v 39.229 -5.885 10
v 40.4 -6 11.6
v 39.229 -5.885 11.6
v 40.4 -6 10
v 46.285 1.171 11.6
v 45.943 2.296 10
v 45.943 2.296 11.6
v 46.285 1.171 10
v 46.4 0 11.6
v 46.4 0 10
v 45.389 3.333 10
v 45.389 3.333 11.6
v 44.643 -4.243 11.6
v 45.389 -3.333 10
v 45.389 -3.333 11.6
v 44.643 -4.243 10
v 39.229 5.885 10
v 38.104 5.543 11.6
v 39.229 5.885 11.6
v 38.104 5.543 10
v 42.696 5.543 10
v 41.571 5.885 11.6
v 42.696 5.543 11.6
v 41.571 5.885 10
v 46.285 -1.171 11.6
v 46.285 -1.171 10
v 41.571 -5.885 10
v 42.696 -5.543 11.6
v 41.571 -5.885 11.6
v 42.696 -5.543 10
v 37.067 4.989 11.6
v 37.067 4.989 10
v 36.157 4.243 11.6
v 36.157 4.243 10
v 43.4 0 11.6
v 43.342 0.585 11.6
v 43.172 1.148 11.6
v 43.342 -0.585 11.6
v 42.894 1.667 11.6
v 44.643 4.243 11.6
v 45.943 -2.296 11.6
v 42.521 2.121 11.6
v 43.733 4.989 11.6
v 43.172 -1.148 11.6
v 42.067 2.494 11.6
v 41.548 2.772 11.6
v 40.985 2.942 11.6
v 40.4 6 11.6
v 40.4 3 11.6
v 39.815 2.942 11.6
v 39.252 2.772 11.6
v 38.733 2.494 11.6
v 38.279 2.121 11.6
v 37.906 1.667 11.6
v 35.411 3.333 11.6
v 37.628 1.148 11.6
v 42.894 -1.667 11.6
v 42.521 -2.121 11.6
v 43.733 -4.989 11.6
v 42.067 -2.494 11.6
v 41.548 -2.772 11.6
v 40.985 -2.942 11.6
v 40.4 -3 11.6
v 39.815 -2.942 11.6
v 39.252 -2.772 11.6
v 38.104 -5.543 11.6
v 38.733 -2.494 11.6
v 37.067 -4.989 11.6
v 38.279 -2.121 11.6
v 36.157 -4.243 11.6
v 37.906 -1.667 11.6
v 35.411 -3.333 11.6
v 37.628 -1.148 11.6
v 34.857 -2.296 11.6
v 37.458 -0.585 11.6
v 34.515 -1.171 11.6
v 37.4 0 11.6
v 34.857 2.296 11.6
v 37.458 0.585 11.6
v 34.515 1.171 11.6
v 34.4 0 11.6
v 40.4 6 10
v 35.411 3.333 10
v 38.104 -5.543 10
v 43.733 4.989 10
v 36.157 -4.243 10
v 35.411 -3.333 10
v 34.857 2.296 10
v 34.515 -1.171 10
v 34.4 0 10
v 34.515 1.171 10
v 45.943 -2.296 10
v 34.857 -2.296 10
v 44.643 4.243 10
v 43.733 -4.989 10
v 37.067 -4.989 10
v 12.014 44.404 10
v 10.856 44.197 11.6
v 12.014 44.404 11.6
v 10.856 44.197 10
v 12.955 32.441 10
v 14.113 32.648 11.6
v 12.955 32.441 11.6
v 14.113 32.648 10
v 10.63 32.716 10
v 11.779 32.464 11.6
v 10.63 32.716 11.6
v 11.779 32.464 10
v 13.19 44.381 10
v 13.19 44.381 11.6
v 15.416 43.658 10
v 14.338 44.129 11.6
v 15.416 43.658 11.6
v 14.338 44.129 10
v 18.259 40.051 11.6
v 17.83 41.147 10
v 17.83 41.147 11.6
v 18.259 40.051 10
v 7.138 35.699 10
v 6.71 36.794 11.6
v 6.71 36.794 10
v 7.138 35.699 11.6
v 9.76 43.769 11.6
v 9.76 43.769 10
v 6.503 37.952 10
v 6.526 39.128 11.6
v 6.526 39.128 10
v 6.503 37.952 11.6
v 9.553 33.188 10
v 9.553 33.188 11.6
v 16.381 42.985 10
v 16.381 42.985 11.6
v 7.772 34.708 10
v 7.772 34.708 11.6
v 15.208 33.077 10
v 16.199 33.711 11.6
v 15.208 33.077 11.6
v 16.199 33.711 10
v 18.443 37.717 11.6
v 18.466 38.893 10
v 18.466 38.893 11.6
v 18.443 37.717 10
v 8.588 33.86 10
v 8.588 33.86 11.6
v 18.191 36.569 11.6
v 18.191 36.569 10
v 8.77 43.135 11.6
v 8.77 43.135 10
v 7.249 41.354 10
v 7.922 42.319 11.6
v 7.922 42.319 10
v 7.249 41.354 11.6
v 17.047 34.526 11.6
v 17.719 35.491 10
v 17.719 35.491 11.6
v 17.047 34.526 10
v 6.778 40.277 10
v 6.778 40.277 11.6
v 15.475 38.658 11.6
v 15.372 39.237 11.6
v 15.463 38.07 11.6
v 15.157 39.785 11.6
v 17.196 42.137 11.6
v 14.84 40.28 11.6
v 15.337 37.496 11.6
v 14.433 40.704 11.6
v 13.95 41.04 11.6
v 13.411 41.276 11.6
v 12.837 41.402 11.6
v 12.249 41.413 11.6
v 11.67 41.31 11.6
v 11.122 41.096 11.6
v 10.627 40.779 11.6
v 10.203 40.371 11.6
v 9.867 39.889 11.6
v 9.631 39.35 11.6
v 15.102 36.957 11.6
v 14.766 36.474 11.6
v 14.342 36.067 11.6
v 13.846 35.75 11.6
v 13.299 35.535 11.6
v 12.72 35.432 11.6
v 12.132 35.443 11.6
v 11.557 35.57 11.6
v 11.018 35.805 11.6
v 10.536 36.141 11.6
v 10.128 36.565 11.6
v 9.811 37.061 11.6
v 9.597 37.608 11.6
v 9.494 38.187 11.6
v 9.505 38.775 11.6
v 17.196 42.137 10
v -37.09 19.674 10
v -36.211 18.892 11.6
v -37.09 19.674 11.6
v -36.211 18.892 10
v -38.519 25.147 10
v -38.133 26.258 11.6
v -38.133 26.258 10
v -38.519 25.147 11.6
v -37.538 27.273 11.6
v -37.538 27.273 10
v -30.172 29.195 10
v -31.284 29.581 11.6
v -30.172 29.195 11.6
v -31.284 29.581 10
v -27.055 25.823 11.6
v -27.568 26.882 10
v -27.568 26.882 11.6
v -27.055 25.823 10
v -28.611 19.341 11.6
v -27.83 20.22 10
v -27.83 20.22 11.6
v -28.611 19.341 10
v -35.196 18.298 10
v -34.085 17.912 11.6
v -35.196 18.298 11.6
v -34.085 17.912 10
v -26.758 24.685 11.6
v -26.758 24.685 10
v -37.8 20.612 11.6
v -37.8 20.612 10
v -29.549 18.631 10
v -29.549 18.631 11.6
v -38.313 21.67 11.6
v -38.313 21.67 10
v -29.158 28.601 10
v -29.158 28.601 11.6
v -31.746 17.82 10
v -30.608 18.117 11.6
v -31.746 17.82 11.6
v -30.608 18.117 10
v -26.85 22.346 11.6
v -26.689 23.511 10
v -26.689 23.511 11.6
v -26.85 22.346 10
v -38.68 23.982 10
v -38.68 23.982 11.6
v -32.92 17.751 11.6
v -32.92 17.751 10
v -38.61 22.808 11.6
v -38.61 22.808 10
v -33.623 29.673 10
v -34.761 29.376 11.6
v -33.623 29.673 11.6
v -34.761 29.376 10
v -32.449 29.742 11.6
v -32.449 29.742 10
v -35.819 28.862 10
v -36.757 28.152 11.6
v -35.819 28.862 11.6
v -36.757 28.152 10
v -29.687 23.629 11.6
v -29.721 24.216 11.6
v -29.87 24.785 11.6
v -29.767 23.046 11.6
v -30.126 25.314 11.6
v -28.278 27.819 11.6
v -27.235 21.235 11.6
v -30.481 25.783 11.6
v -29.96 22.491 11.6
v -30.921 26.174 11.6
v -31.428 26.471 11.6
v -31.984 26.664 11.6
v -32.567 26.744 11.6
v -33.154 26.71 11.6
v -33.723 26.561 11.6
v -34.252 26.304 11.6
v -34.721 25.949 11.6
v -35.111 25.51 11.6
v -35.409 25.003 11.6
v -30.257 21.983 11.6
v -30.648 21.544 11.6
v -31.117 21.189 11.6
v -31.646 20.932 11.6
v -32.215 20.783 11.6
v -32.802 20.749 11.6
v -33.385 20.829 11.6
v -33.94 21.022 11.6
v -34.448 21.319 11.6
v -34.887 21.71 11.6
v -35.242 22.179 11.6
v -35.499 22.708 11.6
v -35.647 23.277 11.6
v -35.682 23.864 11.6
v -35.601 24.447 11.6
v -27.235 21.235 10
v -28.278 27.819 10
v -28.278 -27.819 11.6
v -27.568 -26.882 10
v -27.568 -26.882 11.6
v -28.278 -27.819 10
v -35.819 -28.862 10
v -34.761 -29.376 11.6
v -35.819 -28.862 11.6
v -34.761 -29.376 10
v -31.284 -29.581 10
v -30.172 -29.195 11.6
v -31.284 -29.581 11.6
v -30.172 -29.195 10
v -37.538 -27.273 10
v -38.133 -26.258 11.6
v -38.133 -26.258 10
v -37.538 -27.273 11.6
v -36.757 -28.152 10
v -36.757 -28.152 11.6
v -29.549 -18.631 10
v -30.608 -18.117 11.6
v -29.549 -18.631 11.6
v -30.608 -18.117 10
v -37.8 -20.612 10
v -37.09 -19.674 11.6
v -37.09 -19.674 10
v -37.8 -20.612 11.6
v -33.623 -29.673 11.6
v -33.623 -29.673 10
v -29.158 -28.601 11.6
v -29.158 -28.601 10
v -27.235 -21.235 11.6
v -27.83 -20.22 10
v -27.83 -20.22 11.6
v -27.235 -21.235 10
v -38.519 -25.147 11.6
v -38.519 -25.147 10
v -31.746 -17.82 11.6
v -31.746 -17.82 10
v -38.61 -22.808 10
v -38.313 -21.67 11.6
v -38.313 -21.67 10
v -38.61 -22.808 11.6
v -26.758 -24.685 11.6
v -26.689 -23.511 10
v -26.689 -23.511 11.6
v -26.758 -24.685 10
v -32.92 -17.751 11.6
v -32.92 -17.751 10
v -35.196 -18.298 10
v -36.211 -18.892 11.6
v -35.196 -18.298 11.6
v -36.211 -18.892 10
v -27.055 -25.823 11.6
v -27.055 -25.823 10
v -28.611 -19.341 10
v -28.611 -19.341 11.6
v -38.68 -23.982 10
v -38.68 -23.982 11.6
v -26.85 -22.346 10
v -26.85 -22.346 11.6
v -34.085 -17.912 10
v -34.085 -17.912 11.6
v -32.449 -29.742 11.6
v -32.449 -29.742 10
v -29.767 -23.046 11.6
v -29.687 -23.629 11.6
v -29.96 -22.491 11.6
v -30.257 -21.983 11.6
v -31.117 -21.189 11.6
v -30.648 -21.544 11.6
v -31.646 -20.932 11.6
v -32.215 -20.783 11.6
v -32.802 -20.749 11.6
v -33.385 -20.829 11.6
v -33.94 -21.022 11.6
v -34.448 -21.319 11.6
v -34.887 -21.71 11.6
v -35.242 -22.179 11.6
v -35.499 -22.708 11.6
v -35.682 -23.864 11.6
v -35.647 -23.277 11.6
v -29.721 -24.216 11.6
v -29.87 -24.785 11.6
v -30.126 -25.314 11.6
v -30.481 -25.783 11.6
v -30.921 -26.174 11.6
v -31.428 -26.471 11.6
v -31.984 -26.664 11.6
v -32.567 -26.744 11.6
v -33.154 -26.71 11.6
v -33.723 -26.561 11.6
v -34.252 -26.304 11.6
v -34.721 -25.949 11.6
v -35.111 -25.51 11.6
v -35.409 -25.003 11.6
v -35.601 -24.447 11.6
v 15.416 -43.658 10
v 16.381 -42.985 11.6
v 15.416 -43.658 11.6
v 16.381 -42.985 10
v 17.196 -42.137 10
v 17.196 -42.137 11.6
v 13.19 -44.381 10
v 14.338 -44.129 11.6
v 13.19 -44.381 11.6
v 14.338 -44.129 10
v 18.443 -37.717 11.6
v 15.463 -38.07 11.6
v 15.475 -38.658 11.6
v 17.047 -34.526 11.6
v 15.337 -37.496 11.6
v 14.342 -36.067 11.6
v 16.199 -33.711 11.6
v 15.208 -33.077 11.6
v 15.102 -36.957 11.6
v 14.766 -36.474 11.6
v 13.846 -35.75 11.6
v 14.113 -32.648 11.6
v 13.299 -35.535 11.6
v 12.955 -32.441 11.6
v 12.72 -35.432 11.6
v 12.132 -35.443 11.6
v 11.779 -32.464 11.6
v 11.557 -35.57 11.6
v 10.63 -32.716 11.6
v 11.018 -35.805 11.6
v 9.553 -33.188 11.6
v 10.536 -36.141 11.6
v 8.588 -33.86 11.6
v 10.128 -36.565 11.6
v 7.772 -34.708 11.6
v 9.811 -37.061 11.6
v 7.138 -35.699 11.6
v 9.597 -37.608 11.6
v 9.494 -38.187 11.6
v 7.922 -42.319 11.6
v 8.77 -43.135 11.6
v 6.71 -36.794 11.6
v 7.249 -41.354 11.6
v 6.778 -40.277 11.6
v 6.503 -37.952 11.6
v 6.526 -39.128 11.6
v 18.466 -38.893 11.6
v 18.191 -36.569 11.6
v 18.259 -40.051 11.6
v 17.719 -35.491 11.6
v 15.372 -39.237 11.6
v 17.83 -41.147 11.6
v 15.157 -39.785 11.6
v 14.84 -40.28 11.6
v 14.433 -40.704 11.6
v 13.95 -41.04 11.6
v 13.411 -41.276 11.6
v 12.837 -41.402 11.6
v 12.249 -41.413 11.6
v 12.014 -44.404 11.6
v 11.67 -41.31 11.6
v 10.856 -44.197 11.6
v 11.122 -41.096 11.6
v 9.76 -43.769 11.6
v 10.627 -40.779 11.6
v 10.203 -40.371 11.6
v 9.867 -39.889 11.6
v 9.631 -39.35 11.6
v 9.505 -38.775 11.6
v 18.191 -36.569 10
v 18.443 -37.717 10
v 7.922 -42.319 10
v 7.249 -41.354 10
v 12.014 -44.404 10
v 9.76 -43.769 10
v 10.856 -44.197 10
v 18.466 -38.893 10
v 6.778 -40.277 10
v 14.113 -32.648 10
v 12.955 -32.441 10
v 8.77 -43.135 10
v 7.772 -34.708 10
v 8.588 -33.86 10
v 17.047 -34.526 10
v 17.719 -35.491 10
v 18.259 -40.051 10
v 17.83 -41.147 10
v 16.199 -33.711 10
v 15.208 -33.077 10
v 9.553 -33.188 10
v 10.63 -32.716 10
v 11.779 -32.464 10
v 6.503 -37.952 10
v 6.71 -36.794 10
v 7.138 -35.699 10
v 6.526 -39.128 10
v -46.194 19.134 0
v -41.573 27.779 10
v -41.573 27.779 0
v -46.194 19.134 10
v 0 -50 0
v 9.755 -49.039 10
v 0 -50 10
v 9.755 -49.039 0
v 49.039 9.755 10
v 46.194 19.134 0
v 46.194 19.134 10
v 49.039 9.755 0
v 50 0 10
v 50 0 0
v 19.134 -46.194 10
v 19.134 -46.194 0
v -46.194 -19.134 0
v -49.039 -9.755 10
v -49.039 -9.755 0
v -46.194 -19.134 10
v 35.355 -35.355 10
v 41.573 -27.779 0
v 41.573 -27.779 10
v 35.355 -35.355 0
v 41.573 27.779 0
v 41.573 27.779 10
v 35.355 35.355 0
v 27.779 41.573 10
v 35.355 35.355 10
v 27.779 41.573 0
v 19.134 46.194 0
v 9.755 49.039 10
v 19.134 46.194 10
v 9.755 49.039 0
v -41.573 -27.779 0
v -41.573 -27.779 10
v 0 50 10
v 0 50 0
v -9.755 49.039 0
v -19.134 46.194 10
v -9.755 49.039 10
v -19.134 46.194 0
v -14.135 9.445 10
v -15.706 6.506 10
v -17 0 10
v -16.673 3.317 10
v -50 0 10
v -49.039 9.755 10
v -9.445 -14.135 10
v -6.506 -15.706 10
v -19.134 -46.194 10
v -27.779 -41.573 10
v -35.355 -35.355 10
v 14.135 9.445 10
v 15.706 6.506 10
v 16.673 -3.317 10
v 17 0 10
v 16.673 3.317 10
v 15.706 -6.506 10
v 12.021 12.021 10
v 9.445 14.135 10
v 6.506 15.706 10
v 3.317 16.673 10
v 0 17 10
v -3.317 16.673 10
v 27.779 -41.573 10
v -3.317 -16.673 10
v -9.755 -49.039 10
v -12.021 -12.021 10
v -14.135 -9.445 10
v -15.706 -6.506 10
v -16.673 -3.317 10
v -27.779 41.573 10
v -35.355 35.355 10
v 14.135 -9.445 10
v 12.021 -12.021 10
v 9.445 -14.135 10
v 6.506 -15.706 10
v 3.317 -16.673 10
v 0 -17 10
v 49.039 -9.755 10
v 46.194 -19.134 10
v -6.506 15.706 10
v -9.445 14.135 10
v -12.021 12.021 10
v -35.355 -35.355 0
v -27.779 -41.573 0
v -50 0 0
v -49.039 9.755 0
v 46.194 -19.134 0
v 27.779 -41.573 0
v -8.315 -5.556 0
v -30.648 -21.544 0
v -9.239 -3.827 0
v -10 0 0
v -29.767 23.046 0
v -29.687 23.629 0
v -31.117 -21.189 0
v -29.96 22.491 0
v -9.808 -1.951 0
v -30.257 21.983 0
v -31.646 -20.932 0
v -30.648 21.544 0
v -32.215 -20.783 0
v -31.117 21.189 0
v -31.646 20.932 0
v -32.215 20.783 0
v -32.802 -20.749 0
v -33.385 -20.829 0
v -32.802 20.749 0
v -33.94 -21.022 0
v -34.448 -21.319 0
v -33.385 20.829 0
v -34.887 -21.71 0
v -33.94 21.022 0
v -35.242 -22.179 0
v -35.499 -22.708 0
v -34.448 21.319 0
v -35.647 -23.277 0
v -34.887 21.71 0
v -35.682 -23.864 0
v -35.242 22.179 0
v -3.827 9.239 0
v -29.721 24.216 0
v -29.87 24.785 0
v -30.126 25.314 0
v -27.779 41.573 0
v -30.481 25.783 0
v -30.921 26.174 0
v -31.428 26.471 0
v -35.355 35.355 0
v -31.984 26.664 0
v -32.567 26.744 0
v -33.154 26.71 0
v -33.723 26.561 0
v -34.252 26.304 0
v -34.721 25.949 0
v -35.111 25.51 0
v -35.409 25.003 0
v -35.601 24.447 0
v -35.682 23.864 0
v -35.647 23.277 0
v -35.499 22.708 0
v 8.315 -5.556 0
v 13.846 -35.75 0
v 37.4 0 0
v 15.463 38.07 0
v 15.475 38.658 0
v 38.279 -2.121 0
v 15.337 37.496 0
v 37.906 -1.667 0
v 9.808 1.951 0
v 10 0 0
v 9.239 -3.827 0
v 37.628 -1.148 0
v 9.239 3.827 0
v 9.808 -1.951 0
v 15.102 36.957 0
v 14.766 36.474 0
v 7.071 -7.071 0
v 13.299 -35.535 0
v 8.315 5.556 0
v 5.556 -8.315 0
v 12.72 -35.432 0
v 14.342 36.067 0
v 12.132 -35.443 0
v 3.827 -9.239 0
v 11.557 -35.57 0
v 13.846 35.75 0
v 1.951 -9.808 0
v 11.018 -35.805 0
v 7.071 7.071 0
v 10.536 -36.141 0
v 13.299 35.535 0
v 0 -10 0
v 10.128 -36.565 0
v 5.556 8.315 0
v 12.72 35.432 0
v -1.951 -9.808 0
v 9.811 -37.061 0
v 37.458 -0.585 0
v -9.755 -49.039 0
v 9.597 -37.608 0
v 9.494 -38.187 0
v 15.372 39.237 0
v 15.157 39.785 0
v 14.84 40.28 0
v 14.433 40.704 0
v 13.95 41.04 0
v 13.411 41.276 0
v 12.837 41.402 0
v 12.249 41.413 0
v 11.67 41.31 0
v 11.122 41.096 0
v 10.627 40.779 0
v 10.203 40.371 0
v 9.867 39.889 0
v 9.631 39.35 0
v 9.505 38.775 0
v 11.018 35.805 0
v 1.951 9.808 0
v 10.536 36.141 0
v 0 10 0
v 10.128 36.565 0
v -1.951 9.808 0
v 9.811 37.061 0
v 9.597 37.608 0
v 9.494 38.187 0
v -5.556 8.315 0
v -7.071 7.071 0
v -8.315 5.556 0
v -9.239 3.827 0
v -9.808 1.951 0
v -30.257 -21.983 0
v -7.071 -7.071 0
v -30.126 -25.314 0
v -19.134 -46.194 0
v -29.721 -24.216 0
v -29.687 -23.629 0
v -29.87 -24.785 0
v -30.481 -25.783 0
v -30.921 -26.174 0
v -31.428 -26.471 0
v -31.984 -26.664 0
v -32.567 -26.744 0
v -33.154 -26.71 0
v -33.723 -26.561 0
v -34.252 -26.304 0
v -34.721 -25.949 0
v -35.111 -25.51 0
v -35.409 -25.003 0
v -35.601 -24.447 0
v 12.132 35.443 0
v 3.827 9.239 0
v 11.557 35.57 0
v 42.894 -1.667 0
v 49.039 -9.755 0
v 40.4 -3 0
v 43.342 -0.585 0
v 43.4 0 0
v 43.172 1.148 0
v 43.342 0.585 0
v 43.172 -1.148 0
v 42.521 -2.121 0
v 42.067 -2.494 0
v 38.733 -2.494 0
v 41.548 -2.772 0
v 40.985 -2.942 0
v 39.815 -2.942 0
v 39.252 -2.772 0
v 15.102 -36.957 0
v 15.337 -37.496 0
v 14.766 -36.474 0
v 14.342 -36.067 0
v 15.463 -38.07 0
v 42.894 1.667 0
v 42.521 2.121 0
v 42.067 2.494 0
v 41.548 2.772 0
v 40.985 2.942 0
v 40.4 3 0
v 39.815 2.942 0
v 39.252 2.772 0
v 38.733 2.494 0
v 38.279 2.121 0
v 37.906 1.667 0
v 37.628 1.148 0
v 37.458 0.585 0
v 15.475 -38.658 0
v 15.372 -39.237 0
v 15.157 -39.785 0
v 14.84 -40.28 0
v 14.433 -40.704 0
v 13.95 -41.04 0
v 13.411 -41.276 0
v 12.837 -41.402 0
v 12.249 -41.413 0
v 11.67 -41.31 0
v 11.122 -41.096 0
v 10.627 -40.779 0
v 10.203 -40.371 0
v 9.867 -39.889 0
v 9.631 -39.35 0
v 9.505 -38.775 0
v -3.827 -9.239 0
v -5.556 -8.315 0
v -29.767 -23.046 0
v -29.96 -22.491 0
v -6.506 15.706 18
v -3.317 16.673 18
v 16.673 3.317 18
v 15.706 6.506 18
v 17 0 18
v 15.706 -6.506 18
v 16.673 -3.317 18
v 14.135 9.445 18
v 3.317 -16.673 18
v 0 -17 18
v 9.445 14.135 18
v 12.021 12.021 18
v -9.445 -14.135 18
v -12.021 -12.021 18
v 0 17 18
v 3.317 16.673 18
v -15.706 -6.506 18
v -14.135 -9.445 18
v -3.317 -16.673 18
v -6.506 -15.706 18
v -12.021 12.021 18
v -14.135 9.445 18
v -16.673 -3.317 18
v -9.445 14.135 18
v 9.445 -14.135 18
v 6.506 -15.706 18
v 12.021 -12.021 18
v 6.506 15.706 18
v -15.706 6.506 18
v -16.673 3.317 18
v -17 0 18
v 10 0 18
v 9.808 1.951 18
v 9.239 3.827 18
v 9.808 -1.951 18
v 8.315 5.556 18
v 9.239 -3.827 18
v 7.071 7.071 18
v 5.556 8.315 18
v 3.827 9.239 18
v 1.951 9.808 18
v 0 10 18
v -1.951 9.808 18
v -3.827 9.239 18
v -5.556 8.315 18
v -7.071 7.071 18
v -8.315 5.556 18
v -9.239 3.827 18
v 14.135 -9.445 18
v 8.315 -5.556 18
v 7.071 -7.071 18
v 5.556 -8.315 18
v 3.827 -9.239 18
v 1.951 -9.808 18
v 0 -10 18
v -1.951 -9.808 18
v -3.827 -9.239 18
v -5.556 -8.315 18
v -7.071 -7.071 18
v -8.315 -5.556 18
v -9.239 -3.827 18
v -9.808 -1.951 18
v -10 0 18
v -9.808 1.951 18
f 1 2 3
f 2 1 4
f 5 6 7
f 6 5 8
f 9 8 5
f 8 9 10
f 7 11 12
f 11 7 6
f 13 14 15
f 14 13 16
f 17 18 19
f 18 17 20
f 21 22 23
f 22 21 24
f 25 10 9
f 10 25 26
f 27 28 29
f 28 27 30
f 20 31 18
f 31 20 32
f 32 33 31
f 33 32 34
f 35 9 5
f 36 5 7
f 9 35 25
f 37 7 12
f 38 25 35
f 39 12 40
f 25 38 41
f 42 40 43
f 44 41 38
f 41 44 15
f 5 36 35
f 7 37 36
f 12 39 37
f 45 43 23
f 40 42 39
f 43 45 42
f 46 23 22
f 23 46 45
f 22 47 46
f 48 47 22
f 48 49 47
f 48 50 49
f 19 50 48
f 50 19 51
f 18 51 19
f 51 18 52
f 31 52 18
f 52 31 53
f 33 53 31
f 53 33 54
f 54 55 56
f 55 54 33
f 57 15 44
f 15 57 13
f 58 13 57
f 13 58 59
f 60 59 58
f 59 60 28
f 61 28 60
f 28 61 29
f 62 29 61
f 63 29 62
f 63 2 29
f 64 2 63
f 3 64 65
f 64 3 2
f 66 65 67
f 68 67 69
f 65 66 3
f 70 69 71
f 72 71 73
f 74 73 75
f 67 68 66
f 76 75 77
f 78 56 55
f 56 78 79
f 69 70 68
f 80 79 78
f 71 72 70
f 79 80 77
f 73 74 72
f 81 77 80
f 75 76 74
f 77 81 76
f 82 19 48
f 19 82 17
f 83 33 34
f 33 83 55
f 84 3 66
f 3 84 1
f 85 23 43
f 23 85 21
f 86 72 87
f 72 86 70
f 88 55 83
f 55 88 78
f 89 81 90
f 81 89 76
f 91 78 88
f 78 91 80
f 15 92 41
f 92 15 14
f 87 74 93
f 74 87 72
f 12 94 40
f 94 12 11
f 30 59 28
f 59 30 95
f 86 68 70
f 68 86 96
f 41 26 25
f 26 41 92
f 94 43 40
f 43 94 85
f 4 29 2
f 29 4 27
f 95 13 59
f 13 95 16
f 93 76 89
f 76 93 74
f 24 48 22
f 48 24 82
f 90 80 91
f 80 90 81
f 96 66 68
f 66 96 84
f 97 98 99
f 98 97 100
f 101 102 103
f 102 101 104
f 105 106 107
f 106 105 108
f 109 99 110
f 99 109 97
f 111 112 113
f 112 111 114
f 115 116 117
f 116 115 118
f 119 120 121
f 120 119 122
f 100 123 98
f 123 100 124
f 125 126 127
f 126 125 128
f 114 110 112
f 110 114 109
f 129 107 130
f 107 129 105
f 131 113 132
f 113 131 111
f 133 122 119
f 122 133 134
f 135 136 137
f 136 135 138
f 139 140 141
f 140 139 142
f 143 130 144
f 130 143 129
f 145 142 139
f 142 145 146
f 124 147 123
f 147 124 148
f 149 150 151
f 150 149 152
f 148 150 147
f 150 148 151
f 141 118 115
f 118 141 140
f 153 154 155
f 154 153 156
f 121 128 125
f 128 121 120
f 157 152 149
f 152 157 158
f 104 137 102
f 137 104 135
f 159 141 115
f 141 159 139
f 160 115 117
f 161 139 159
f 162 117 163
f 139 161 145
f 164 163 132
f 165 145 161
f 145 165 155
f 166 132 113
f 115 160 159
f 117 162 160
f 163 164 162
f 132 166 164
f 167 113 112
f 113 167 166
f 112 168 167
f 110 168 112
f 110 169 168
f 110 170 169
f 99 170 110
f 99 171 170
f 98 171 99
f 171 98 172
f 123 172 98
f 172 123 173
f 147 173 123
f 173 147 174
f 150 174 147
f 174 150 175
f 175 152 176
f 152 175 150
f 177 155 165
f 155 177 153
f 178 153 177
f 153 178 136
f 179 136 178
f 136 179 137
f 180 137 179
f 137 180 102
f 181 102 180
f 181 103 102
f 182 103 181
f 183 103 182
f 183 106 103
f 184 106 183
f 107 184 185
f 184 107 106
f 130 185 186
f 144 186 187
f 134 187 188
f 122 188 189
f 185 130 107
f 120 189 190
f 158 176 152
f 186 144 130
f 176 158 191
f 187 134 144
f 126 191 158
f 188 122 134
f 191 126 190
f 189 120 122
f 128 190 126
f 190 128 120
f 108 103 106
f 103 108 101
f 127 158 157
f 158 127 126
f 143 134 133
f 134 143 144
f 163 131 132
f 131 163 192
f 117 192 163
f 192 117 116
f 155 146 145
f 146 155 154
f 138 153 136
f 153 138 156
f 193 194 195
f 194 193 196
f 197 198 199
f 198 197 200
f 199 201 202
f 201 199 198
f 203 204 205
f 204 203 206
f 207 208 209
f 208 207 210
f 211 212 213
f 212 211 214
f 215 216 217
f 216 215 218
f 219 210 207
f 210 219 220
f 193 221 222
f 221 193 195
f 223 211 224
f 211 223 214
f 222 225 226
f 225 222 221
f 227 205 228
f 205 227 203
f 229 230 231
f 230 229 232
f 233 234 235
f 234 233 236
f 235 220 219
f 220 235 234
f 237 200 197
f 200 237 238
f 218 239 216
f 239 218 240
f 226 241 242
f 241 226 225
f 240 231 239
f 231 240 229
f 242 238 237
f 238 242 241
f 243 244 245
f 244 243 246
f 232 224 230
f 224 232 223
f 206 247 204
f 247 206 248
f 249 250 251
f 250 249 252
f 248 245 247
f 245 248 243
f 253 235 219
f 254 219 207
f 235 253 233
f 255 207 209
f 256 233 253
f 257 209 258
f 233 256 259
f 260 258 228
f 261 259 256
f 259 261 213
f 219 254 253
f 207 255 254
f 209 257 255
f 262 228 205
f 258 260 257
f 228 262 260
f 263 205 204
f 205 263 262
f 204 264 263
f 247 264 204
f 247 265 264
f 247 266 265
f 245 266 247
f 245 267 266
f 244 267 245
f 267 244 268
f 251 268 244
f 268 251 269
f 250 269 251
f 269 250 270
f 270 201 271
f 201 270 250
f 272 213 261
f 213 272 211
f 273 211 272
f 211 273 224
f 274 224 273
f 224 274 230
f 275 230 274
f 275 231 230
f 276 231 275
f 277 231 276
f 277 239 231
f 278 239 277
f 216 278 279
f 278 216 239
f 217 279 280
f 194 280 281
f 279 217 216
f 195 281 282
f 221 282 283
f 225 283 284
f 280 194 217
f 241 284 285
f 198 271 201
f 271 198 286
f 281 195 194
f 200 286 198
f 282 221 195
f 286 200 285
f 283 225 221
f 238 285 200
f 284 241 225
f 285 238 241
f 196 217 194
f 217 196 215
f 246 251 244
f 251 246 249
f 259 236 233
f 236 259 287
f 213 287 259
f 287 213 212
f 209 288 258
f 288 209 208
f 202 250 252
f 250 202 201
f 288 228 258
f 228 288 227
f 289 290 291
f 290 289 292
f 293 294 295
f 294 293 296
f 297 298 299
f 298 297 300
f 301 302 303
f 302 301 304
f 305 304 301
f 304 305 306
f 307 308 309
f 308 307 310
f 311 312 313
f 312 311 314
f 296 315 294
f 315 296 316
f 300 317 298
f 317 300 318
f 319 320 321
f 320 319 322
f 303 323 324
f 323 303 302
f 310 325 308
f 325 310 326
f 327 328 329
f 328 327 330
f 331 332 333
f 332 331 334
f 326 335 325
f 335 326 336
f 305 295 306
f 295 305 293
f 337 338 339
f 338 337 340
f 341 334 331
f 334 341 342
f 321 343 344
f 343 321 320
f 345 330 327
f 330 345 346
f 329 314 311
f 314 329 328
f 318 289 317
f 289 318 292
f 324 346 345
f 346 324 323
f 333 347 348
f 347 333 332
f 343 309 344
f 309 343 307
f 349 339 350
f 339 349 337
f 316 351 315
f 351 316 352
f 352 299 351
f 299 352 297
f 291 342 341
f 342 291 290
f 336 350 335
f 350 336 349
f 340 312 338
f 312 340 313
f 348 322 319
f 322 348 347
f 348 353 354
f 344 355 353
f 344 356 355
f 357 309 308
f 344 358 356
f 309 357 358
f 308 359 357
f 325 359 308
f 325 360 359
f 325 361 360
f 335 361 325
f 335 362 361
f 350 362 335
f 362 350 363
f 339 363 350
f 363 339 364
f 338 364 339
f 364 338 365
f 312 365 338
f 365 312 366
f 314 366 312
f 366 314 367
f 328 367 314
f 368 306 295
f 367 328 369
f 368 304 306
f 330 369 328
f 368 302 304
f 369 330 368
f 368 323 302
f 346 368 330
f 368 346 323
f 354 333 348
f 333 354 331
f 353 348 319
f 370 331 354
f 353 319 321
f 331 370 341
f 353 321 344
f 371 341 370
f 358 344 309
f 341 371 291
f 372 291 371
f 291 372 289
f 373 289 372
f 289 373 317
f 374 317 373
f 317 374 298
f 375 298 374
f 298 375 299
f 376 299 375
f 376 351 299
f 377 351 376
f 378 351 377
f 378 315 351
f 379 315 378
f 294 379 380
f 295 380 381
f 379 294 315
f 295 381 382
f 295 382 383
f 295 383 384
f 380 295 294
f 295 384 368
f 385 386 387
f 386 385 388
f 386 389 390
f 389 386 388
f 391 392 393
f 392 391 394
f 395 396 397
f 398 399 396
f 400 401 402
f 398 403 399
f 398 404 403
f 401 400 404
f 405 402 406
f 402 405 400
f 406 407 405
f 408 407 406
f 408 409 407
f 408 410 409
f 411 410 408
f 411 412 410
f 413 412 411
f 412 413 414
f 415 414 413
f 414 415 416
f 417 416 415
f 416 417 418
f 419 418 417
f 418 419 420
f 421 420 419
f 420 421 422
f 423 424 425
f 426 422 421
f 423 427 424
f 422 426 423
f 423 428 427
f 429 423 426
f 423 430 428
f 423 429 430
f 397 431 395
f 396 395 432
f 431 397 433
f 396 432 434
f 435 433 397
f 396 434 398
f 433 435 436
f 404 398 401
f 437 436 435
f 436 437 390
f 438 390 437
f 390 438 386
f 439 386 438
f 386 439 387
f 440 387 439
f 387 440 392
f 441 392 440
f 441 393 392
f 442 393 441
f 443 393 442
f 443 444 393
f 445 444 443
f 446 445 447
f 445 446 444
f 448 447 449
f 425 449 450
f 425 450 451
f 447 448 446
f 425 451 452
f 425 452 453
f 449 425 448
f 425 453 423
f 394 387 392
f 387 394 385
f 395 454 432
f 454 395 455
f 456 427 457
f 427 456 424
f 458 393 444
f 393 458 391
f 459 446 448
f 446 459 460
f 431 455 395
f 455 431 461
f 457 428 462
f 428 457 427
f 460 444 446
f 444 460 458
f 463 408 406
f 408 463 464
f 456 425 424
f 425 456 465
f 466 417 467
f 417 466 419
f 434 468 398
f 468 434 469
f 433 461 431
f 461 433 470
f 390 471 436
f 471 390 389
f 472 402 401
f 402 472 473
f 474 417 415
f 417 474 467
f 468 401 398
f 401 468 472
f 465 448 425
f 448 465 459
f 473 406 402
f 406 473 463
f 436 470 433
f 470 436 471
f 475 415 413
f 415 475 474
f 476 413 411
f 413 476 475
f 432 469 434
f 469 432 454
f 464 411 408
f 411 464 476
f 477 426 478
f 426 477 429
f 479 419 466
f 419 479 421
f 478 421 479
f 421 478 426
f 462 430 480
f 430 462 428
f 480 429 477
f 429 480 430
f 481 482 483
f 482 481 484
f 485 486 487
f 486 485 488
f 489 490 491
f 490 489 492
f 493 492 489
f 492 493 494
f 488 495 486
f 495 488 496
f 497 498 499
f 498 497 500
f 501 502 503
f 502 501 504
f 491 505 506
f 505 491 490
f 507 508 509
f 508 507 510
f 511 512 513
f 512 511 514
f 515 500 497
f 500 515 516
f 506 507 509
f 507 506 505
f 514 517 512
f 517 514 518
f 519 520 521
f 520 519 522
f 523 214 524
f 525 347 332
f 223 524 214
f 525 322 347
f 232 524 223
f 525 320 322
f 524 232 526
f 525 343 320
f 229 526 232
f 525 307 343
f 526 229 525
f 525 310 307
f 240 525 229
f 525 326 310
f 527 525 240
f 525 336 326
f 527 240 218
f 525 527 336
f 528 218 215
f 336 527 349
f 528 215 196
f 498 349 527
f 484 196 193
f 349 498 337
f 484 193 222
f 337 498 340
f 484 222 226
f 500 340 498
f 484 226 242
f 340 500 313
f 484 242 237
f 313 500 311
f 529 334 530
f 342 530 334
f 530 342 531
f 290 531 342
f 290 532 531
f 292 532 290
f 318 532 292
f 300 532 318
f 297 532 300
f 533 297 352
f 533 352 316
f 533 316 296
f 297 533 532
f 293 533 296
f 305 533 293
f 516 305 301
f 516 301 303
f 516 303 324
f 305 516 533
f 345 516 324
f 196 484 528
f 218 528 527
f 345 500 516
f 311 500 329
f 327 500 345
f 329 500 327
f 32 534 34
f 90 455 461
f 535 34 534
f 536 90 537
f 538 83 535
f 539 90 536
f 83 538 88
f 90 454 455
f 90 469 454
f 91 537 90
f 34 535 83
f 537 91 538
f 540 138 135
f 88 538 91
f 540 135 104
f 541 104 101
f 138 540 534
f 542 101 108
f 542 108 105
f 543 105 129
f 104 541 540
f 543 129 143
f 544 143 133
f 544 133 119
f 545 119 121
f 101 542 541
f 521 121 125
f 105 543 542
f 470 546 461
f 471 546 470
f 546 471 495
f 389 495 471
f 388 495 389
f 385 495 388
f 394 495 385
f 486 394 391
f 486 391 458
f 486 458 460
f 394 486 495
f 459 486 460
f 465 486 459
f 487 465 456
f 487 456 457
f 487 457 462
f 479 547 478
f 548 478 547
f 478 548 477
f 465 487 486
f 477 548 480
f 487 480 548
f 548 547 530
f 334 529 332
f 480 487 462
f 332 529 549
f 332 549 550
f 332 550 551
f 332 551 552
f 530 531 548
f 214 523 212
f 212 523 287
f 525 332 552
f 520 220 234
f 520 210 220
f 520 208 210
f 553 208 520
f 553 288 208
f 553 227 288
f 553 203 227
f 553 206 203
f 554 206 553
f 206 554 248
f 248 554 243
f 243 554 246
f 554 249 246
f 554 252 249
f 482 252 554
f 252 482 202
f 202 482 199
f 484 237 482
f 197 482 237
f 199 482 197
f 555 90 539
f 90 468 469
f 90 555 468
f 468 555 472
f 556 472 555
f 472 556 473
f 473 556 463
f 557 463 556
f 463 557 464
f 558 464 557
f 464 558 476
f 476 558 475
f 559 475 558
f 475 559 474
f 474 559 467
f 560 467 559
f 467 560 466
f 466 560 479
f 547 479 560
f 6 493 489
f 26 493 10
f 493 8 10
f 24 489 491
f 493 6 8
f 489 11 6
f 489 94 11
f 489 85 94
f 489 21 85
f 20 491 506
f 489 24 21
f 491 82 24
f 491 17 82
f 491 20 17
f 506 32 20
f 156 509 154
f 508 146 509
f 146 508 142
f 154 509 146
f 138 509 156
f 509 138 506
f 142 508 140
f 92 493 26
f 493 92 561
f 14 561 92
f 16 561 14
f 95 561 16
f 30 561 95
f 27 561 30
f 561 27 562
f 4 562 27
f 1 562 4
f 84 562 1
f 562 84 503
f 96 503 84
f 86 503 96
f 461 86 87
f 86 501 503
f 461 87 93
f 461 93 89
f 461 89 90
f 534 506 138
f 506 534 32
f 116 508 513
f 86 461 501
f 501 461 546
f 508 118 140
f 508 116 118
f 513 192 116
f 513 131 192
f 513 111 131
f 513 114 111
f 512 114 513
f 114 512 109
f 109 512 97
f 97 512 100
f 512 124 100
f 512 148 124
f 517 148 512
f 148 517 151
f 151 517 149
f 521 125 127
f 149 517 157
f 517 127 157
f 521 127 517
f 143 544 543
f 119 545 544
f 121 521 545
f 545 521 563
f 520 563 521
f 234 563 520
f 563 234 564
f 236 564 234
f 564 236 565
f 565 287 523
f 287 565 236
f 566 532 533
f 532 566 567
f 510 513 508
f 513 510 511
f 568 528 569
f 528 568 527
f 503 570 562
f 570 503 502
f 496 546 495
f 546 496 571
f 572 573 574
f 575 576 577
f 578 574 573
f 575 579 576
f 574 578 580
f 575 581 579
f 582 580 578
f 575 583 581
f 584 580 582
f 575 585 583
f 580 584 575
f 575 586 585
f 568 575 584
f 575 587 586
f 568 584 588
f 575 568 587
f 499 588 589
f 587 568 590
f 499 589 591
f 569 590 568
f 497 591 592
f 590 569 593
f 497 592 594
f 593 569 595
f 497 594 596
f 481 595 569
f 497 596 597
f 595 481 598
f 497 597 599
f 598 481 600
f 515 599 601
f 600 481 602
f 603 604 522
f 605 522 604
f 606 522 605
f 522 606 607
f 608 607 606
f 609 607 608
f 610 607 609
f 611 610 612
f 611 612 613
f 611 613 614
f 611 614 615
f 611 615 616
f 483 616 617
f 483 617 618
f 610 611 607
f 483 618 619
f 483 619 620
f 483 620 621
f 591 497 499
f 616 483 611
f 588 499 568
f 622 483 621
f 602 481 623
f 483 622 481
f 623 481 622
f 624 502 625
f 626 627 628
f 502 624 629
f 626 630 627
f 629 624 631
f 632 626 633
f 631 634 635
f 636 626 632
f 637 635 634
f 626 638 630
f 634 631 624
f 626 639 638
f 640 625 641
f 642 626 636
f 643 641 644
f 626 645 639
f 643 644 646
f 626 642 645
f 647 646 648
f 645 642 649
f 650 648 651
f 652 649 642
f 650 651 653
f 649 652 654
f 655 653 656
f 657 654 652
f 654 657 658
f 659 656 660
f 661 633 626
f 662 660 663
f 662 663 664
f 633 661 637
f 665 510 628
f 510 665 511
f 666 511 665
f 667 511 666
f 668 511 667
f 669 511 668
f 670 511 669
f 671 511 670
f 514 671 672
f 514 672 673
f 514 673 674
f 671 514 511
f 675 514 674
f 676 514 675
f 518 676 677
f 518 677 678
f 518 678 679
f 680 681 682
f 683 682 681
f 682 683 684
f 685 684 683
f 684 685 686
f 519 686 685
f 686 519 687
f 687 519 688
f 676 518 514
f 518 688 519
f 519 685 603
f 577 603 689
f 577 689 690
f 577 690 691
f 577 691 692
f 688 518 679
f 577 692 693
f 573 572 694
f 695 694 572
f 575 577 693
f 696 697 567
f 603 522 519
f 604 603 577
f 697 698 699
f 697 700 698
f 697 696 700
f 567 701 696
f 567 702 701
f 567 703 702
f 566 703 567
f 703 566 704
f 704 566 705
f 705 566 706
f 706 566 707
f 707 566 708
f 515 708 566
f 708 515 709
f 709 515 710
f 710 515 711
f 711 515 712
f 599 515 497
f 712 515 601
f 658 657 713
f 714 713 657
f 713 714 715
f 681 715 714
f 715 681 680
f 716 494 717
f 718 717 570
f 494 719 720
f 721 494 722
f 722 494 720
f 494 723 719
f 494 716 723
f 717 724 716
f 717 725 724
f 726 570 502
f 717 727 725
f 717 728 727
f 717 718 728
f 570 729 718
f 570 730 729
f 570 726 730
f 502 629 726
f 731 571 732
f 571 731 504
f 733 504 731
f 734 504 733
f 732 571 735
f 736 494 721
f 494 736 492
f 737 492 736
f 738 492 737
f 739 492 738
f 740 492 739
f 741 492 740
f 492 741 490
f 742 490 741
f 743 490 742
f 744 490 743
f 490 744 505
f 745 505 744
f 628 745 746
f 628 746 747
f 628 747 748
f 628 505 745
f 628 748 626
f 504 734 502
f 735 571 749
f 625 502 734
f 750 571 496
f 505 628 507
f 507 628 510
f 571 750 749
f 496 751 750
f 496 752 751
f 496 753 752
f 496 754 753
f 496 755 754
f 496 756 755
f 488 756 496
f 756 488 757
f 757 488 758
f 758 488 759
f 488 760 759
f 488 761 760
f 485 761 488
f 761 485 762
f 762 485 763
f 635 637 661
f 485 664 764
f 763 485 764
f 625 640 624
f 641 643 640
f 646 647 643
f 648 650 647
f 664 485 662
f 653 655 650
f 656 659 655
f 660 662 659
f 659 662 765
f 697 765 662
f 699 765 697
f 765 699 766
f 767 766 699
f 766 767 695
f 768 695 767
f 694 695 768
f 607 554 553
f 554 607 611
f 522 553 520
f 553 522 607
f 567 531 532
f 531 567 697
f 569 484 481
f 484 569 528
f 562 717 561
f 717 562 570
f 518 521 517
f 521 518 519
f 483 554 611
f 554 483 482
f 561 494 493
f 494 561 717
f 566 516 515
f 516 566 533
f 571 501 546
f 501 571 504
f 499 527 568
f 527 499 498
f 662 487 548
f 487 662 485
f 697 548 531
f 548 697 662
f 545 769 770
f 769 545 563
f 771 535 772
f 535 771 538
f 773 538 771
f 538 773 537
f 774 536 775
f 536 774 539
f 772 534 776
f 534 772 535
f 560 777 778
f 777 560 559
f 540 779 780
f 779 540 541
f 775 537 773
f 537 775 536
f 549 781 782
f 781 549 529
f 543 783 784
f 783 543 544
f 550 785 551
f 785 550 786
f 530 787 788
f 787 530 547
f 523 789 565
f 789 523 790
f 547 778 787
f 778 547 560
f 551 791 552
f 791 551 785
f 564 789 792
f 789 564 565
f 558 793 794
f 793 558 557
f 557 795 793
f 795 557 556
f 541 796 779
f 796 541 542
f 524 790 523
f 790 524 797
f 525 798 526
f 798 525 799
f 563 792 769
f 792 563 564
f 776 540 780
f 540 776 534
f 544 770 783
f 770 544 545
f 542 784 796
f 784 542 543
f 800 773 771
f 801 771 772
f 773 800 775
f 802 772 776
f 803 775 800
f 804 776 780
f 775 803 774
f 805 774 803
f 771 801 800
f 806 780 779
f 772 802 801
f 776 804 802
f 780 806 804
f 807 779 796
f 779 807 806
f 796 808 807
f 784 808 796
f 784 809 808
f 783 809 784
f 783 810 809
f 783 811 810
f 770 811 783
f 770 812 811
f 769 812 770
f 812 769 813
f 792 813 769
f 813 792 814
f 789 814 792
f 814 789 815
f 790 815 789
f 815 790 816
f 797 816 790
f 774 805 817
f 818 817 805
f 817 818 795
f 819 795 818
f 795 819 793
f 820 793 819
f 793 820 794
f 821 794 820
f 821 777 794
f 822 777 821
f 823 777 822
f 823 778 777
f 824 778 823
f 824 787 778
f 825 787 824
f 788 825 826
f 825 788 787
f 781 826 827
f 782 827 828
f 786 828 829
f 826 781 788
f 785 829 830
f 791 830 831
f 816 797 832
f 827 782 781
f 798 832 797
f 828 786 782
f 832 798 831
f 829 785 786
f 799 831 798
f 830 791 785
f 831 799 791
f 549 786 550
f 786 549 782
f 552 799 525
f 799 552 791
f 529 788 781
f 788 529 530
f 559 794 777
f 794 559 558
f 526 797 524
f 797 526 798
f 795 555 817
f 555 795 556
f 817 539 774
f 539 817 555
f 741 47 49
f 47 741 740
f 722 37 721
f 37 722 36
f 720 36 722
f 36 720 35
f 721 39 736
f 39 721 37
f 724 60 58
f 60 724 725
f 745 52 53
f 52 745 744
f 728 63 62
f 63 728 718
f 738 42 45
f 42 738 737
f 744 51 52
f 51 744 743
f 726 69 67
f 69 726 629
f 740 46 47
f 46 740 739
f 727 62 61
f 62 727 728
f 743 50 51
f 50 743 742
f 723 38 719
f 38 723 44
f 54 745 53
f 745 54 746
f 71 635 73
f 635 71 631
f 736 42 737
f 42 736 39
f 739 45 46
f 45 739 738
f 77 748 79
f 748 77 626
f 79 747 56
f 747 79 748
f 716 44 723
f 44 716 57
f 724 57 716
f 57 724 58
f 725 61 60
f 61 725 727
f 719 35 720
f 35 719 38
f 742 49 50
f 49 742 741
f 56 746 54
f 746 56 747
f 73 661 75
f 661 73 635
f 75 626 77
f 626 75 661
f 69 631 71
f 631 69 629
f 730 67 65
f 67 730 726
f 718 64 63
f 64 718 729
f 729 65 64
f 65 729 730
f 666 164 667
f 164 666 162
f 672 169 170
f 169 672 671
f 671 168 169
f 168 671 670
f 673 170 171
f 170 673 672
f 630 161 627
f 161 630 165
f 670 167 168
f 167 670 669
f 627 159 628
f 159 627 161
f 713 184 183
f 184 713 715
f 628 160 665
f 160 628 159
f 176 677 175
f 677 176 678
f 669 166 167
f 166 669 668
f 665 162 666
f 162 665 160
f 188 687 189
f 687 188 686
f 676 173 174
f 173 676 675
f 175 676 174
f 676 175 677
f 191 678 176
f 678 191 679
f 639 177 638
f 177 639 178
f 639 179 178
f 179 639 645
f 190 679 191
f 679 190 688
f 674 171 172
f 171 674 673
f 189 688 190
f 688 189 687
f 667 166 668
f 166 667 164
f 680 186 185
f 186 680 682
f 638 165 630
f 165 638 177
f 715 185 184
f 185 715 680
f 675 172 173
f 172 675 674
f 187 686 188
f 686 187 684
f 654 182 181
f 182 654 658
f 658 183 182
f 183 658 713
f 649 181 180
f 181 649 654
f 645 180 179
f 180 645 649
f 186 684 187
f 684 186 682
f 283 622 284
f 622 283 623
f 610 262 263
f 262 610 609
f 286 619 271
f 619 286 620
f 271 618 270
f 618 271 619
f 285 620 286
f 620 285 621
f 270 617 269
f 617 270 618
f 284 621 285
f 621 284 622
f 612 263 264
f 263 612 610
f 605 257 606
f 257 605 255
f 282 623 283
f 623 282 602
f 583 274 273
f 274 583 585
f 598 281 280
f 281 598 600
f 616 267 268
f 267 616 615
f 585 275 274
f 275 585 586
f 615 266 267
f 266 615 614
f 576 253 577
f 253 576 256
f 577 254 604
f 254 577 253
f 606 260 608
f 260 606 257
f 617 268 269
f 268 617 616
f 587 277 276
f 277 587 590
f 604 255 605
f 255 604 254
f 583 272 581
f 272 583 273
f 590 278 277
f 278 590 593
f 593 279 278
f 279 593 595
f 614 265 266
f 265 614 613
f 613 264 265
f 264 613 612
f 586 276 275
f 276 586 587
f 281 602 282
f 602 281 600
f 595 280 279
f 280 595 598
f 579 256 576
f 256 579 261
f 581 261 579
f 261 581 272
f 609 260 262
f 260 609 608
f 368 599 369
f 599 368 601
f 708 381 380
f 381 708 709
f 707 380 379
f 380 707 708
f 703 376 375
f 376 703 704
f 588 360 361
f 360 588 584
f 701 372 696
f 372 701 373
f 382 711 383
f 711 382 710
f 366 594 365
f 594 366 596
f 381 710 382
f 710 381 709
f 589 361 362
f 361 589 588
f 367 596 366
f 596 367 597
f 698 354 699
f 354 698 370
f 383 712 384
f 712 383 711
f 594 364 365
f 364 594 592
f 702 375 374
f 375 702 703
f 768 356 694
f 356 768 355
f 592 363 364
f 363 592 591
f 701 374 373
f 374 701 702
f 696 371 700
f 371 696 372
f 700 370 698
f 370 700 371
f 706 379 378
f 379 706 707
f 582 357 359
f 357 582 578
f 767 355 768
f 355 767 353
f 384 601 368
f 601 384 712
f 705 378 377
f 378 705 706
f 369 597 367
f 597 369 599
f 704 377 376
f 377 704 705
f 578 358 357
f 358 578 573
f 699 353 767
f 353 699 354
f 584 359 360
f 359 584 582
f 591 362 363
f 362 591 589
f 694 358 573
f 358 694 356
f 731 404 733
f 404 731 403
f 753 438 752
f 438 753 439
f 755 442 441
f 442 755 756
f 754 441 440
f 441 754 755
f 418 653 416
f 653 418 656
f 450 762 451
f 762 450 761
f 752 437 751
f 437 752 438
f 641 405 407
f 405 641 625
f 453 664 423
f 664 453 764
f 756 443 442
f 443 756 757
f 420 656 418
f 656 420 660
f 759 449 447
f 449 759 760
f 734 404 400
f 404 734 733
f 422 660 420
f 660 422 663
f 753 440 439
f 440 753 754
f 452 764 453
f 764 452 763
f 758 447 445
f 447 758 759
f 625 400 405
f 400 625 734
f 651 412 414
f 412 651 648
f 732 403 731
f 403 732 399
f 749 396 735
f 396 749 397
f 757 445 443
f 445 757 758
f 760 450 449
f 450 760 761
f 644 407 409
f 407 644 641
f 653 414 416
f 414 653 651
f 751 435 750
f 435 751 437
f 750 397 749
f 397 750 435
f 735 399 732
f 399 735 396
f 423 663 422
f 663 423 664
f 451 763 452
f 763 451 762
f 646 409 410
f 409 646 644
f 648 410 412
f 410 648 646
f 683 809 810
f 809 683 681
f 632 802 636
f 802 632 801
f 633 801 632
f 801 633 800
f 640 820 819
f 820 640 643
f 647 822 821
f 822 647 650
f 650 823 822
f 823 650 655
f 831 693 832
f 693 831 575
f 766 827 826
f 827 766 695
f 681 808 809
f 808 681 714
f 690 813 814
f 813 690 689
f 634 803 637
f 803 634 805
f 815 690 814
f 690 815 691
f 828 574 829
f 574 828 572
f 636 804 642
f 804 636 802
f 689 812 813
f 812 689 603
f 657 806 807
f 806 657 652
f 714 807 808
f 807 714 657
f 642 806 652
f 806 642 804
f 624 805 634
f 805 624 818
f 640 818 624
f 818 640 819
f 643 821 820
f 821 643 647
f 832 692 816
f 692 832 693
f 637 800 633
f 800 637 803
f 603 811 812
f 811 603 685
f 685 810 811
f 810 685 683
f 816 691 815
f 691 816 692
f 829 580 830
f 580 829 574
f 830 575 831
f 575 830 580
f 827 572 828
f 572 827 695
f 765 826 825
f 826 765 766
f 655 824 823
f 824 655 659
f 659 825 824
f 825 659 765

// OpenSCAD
$fn = 32;

// ----------------------------------------------------------------------
// Bolt-circle flange: 100 mm outside, 5 bolt holes, bore 20 mm
// ----------------------------------------------------------------------

// --- parameters (mm) ---
flange_d = 100;           // flange outside diameter
flange_t = 10;            // flange thickness
bolts = 5;                // number of bolt holes
bolt_d = 6;               // bolt clearance
bolt_r = 40.4;            // bolt circle radius
bore_d = 20;              // centre bore
hub_d = 34;               // raised hub diameter
hub_h = 8;                // raised hub height
spot_d = 12;              // spot faced bosses
spot_h = 1.6;             // spot face height

module body() {
  cylinder(h = flange_t, d = flange_d);
  /* raised hub, sunk 1 mm into the flange */
  translate([0, 0, flange_t - 1]) cylinder(h = hub_h + 1, d = hub_d);
  /* spot faced pads under the bolt heads */
  for (i = [0 : bolts - 1]) rotate([0, 0, i * 360 / bolts]) translate([bolt_r, 0, flange_t - 1]) cylinder(h = spot_h + 1, d = spot_d);
}

difference() {
  body();
  /* bolt circle */
  for (i = [0 : bolts - 1]) rotate([0, 0, i * 360 / bolts]) translate([bolt_r, 0, -1]) cylinder(h = flange_t + hub_h + 3, d = bolt_d);
  translate([0, 0, -1]) cylinder(h = flange_t + hub_h + 3, d = bore_d);
}
